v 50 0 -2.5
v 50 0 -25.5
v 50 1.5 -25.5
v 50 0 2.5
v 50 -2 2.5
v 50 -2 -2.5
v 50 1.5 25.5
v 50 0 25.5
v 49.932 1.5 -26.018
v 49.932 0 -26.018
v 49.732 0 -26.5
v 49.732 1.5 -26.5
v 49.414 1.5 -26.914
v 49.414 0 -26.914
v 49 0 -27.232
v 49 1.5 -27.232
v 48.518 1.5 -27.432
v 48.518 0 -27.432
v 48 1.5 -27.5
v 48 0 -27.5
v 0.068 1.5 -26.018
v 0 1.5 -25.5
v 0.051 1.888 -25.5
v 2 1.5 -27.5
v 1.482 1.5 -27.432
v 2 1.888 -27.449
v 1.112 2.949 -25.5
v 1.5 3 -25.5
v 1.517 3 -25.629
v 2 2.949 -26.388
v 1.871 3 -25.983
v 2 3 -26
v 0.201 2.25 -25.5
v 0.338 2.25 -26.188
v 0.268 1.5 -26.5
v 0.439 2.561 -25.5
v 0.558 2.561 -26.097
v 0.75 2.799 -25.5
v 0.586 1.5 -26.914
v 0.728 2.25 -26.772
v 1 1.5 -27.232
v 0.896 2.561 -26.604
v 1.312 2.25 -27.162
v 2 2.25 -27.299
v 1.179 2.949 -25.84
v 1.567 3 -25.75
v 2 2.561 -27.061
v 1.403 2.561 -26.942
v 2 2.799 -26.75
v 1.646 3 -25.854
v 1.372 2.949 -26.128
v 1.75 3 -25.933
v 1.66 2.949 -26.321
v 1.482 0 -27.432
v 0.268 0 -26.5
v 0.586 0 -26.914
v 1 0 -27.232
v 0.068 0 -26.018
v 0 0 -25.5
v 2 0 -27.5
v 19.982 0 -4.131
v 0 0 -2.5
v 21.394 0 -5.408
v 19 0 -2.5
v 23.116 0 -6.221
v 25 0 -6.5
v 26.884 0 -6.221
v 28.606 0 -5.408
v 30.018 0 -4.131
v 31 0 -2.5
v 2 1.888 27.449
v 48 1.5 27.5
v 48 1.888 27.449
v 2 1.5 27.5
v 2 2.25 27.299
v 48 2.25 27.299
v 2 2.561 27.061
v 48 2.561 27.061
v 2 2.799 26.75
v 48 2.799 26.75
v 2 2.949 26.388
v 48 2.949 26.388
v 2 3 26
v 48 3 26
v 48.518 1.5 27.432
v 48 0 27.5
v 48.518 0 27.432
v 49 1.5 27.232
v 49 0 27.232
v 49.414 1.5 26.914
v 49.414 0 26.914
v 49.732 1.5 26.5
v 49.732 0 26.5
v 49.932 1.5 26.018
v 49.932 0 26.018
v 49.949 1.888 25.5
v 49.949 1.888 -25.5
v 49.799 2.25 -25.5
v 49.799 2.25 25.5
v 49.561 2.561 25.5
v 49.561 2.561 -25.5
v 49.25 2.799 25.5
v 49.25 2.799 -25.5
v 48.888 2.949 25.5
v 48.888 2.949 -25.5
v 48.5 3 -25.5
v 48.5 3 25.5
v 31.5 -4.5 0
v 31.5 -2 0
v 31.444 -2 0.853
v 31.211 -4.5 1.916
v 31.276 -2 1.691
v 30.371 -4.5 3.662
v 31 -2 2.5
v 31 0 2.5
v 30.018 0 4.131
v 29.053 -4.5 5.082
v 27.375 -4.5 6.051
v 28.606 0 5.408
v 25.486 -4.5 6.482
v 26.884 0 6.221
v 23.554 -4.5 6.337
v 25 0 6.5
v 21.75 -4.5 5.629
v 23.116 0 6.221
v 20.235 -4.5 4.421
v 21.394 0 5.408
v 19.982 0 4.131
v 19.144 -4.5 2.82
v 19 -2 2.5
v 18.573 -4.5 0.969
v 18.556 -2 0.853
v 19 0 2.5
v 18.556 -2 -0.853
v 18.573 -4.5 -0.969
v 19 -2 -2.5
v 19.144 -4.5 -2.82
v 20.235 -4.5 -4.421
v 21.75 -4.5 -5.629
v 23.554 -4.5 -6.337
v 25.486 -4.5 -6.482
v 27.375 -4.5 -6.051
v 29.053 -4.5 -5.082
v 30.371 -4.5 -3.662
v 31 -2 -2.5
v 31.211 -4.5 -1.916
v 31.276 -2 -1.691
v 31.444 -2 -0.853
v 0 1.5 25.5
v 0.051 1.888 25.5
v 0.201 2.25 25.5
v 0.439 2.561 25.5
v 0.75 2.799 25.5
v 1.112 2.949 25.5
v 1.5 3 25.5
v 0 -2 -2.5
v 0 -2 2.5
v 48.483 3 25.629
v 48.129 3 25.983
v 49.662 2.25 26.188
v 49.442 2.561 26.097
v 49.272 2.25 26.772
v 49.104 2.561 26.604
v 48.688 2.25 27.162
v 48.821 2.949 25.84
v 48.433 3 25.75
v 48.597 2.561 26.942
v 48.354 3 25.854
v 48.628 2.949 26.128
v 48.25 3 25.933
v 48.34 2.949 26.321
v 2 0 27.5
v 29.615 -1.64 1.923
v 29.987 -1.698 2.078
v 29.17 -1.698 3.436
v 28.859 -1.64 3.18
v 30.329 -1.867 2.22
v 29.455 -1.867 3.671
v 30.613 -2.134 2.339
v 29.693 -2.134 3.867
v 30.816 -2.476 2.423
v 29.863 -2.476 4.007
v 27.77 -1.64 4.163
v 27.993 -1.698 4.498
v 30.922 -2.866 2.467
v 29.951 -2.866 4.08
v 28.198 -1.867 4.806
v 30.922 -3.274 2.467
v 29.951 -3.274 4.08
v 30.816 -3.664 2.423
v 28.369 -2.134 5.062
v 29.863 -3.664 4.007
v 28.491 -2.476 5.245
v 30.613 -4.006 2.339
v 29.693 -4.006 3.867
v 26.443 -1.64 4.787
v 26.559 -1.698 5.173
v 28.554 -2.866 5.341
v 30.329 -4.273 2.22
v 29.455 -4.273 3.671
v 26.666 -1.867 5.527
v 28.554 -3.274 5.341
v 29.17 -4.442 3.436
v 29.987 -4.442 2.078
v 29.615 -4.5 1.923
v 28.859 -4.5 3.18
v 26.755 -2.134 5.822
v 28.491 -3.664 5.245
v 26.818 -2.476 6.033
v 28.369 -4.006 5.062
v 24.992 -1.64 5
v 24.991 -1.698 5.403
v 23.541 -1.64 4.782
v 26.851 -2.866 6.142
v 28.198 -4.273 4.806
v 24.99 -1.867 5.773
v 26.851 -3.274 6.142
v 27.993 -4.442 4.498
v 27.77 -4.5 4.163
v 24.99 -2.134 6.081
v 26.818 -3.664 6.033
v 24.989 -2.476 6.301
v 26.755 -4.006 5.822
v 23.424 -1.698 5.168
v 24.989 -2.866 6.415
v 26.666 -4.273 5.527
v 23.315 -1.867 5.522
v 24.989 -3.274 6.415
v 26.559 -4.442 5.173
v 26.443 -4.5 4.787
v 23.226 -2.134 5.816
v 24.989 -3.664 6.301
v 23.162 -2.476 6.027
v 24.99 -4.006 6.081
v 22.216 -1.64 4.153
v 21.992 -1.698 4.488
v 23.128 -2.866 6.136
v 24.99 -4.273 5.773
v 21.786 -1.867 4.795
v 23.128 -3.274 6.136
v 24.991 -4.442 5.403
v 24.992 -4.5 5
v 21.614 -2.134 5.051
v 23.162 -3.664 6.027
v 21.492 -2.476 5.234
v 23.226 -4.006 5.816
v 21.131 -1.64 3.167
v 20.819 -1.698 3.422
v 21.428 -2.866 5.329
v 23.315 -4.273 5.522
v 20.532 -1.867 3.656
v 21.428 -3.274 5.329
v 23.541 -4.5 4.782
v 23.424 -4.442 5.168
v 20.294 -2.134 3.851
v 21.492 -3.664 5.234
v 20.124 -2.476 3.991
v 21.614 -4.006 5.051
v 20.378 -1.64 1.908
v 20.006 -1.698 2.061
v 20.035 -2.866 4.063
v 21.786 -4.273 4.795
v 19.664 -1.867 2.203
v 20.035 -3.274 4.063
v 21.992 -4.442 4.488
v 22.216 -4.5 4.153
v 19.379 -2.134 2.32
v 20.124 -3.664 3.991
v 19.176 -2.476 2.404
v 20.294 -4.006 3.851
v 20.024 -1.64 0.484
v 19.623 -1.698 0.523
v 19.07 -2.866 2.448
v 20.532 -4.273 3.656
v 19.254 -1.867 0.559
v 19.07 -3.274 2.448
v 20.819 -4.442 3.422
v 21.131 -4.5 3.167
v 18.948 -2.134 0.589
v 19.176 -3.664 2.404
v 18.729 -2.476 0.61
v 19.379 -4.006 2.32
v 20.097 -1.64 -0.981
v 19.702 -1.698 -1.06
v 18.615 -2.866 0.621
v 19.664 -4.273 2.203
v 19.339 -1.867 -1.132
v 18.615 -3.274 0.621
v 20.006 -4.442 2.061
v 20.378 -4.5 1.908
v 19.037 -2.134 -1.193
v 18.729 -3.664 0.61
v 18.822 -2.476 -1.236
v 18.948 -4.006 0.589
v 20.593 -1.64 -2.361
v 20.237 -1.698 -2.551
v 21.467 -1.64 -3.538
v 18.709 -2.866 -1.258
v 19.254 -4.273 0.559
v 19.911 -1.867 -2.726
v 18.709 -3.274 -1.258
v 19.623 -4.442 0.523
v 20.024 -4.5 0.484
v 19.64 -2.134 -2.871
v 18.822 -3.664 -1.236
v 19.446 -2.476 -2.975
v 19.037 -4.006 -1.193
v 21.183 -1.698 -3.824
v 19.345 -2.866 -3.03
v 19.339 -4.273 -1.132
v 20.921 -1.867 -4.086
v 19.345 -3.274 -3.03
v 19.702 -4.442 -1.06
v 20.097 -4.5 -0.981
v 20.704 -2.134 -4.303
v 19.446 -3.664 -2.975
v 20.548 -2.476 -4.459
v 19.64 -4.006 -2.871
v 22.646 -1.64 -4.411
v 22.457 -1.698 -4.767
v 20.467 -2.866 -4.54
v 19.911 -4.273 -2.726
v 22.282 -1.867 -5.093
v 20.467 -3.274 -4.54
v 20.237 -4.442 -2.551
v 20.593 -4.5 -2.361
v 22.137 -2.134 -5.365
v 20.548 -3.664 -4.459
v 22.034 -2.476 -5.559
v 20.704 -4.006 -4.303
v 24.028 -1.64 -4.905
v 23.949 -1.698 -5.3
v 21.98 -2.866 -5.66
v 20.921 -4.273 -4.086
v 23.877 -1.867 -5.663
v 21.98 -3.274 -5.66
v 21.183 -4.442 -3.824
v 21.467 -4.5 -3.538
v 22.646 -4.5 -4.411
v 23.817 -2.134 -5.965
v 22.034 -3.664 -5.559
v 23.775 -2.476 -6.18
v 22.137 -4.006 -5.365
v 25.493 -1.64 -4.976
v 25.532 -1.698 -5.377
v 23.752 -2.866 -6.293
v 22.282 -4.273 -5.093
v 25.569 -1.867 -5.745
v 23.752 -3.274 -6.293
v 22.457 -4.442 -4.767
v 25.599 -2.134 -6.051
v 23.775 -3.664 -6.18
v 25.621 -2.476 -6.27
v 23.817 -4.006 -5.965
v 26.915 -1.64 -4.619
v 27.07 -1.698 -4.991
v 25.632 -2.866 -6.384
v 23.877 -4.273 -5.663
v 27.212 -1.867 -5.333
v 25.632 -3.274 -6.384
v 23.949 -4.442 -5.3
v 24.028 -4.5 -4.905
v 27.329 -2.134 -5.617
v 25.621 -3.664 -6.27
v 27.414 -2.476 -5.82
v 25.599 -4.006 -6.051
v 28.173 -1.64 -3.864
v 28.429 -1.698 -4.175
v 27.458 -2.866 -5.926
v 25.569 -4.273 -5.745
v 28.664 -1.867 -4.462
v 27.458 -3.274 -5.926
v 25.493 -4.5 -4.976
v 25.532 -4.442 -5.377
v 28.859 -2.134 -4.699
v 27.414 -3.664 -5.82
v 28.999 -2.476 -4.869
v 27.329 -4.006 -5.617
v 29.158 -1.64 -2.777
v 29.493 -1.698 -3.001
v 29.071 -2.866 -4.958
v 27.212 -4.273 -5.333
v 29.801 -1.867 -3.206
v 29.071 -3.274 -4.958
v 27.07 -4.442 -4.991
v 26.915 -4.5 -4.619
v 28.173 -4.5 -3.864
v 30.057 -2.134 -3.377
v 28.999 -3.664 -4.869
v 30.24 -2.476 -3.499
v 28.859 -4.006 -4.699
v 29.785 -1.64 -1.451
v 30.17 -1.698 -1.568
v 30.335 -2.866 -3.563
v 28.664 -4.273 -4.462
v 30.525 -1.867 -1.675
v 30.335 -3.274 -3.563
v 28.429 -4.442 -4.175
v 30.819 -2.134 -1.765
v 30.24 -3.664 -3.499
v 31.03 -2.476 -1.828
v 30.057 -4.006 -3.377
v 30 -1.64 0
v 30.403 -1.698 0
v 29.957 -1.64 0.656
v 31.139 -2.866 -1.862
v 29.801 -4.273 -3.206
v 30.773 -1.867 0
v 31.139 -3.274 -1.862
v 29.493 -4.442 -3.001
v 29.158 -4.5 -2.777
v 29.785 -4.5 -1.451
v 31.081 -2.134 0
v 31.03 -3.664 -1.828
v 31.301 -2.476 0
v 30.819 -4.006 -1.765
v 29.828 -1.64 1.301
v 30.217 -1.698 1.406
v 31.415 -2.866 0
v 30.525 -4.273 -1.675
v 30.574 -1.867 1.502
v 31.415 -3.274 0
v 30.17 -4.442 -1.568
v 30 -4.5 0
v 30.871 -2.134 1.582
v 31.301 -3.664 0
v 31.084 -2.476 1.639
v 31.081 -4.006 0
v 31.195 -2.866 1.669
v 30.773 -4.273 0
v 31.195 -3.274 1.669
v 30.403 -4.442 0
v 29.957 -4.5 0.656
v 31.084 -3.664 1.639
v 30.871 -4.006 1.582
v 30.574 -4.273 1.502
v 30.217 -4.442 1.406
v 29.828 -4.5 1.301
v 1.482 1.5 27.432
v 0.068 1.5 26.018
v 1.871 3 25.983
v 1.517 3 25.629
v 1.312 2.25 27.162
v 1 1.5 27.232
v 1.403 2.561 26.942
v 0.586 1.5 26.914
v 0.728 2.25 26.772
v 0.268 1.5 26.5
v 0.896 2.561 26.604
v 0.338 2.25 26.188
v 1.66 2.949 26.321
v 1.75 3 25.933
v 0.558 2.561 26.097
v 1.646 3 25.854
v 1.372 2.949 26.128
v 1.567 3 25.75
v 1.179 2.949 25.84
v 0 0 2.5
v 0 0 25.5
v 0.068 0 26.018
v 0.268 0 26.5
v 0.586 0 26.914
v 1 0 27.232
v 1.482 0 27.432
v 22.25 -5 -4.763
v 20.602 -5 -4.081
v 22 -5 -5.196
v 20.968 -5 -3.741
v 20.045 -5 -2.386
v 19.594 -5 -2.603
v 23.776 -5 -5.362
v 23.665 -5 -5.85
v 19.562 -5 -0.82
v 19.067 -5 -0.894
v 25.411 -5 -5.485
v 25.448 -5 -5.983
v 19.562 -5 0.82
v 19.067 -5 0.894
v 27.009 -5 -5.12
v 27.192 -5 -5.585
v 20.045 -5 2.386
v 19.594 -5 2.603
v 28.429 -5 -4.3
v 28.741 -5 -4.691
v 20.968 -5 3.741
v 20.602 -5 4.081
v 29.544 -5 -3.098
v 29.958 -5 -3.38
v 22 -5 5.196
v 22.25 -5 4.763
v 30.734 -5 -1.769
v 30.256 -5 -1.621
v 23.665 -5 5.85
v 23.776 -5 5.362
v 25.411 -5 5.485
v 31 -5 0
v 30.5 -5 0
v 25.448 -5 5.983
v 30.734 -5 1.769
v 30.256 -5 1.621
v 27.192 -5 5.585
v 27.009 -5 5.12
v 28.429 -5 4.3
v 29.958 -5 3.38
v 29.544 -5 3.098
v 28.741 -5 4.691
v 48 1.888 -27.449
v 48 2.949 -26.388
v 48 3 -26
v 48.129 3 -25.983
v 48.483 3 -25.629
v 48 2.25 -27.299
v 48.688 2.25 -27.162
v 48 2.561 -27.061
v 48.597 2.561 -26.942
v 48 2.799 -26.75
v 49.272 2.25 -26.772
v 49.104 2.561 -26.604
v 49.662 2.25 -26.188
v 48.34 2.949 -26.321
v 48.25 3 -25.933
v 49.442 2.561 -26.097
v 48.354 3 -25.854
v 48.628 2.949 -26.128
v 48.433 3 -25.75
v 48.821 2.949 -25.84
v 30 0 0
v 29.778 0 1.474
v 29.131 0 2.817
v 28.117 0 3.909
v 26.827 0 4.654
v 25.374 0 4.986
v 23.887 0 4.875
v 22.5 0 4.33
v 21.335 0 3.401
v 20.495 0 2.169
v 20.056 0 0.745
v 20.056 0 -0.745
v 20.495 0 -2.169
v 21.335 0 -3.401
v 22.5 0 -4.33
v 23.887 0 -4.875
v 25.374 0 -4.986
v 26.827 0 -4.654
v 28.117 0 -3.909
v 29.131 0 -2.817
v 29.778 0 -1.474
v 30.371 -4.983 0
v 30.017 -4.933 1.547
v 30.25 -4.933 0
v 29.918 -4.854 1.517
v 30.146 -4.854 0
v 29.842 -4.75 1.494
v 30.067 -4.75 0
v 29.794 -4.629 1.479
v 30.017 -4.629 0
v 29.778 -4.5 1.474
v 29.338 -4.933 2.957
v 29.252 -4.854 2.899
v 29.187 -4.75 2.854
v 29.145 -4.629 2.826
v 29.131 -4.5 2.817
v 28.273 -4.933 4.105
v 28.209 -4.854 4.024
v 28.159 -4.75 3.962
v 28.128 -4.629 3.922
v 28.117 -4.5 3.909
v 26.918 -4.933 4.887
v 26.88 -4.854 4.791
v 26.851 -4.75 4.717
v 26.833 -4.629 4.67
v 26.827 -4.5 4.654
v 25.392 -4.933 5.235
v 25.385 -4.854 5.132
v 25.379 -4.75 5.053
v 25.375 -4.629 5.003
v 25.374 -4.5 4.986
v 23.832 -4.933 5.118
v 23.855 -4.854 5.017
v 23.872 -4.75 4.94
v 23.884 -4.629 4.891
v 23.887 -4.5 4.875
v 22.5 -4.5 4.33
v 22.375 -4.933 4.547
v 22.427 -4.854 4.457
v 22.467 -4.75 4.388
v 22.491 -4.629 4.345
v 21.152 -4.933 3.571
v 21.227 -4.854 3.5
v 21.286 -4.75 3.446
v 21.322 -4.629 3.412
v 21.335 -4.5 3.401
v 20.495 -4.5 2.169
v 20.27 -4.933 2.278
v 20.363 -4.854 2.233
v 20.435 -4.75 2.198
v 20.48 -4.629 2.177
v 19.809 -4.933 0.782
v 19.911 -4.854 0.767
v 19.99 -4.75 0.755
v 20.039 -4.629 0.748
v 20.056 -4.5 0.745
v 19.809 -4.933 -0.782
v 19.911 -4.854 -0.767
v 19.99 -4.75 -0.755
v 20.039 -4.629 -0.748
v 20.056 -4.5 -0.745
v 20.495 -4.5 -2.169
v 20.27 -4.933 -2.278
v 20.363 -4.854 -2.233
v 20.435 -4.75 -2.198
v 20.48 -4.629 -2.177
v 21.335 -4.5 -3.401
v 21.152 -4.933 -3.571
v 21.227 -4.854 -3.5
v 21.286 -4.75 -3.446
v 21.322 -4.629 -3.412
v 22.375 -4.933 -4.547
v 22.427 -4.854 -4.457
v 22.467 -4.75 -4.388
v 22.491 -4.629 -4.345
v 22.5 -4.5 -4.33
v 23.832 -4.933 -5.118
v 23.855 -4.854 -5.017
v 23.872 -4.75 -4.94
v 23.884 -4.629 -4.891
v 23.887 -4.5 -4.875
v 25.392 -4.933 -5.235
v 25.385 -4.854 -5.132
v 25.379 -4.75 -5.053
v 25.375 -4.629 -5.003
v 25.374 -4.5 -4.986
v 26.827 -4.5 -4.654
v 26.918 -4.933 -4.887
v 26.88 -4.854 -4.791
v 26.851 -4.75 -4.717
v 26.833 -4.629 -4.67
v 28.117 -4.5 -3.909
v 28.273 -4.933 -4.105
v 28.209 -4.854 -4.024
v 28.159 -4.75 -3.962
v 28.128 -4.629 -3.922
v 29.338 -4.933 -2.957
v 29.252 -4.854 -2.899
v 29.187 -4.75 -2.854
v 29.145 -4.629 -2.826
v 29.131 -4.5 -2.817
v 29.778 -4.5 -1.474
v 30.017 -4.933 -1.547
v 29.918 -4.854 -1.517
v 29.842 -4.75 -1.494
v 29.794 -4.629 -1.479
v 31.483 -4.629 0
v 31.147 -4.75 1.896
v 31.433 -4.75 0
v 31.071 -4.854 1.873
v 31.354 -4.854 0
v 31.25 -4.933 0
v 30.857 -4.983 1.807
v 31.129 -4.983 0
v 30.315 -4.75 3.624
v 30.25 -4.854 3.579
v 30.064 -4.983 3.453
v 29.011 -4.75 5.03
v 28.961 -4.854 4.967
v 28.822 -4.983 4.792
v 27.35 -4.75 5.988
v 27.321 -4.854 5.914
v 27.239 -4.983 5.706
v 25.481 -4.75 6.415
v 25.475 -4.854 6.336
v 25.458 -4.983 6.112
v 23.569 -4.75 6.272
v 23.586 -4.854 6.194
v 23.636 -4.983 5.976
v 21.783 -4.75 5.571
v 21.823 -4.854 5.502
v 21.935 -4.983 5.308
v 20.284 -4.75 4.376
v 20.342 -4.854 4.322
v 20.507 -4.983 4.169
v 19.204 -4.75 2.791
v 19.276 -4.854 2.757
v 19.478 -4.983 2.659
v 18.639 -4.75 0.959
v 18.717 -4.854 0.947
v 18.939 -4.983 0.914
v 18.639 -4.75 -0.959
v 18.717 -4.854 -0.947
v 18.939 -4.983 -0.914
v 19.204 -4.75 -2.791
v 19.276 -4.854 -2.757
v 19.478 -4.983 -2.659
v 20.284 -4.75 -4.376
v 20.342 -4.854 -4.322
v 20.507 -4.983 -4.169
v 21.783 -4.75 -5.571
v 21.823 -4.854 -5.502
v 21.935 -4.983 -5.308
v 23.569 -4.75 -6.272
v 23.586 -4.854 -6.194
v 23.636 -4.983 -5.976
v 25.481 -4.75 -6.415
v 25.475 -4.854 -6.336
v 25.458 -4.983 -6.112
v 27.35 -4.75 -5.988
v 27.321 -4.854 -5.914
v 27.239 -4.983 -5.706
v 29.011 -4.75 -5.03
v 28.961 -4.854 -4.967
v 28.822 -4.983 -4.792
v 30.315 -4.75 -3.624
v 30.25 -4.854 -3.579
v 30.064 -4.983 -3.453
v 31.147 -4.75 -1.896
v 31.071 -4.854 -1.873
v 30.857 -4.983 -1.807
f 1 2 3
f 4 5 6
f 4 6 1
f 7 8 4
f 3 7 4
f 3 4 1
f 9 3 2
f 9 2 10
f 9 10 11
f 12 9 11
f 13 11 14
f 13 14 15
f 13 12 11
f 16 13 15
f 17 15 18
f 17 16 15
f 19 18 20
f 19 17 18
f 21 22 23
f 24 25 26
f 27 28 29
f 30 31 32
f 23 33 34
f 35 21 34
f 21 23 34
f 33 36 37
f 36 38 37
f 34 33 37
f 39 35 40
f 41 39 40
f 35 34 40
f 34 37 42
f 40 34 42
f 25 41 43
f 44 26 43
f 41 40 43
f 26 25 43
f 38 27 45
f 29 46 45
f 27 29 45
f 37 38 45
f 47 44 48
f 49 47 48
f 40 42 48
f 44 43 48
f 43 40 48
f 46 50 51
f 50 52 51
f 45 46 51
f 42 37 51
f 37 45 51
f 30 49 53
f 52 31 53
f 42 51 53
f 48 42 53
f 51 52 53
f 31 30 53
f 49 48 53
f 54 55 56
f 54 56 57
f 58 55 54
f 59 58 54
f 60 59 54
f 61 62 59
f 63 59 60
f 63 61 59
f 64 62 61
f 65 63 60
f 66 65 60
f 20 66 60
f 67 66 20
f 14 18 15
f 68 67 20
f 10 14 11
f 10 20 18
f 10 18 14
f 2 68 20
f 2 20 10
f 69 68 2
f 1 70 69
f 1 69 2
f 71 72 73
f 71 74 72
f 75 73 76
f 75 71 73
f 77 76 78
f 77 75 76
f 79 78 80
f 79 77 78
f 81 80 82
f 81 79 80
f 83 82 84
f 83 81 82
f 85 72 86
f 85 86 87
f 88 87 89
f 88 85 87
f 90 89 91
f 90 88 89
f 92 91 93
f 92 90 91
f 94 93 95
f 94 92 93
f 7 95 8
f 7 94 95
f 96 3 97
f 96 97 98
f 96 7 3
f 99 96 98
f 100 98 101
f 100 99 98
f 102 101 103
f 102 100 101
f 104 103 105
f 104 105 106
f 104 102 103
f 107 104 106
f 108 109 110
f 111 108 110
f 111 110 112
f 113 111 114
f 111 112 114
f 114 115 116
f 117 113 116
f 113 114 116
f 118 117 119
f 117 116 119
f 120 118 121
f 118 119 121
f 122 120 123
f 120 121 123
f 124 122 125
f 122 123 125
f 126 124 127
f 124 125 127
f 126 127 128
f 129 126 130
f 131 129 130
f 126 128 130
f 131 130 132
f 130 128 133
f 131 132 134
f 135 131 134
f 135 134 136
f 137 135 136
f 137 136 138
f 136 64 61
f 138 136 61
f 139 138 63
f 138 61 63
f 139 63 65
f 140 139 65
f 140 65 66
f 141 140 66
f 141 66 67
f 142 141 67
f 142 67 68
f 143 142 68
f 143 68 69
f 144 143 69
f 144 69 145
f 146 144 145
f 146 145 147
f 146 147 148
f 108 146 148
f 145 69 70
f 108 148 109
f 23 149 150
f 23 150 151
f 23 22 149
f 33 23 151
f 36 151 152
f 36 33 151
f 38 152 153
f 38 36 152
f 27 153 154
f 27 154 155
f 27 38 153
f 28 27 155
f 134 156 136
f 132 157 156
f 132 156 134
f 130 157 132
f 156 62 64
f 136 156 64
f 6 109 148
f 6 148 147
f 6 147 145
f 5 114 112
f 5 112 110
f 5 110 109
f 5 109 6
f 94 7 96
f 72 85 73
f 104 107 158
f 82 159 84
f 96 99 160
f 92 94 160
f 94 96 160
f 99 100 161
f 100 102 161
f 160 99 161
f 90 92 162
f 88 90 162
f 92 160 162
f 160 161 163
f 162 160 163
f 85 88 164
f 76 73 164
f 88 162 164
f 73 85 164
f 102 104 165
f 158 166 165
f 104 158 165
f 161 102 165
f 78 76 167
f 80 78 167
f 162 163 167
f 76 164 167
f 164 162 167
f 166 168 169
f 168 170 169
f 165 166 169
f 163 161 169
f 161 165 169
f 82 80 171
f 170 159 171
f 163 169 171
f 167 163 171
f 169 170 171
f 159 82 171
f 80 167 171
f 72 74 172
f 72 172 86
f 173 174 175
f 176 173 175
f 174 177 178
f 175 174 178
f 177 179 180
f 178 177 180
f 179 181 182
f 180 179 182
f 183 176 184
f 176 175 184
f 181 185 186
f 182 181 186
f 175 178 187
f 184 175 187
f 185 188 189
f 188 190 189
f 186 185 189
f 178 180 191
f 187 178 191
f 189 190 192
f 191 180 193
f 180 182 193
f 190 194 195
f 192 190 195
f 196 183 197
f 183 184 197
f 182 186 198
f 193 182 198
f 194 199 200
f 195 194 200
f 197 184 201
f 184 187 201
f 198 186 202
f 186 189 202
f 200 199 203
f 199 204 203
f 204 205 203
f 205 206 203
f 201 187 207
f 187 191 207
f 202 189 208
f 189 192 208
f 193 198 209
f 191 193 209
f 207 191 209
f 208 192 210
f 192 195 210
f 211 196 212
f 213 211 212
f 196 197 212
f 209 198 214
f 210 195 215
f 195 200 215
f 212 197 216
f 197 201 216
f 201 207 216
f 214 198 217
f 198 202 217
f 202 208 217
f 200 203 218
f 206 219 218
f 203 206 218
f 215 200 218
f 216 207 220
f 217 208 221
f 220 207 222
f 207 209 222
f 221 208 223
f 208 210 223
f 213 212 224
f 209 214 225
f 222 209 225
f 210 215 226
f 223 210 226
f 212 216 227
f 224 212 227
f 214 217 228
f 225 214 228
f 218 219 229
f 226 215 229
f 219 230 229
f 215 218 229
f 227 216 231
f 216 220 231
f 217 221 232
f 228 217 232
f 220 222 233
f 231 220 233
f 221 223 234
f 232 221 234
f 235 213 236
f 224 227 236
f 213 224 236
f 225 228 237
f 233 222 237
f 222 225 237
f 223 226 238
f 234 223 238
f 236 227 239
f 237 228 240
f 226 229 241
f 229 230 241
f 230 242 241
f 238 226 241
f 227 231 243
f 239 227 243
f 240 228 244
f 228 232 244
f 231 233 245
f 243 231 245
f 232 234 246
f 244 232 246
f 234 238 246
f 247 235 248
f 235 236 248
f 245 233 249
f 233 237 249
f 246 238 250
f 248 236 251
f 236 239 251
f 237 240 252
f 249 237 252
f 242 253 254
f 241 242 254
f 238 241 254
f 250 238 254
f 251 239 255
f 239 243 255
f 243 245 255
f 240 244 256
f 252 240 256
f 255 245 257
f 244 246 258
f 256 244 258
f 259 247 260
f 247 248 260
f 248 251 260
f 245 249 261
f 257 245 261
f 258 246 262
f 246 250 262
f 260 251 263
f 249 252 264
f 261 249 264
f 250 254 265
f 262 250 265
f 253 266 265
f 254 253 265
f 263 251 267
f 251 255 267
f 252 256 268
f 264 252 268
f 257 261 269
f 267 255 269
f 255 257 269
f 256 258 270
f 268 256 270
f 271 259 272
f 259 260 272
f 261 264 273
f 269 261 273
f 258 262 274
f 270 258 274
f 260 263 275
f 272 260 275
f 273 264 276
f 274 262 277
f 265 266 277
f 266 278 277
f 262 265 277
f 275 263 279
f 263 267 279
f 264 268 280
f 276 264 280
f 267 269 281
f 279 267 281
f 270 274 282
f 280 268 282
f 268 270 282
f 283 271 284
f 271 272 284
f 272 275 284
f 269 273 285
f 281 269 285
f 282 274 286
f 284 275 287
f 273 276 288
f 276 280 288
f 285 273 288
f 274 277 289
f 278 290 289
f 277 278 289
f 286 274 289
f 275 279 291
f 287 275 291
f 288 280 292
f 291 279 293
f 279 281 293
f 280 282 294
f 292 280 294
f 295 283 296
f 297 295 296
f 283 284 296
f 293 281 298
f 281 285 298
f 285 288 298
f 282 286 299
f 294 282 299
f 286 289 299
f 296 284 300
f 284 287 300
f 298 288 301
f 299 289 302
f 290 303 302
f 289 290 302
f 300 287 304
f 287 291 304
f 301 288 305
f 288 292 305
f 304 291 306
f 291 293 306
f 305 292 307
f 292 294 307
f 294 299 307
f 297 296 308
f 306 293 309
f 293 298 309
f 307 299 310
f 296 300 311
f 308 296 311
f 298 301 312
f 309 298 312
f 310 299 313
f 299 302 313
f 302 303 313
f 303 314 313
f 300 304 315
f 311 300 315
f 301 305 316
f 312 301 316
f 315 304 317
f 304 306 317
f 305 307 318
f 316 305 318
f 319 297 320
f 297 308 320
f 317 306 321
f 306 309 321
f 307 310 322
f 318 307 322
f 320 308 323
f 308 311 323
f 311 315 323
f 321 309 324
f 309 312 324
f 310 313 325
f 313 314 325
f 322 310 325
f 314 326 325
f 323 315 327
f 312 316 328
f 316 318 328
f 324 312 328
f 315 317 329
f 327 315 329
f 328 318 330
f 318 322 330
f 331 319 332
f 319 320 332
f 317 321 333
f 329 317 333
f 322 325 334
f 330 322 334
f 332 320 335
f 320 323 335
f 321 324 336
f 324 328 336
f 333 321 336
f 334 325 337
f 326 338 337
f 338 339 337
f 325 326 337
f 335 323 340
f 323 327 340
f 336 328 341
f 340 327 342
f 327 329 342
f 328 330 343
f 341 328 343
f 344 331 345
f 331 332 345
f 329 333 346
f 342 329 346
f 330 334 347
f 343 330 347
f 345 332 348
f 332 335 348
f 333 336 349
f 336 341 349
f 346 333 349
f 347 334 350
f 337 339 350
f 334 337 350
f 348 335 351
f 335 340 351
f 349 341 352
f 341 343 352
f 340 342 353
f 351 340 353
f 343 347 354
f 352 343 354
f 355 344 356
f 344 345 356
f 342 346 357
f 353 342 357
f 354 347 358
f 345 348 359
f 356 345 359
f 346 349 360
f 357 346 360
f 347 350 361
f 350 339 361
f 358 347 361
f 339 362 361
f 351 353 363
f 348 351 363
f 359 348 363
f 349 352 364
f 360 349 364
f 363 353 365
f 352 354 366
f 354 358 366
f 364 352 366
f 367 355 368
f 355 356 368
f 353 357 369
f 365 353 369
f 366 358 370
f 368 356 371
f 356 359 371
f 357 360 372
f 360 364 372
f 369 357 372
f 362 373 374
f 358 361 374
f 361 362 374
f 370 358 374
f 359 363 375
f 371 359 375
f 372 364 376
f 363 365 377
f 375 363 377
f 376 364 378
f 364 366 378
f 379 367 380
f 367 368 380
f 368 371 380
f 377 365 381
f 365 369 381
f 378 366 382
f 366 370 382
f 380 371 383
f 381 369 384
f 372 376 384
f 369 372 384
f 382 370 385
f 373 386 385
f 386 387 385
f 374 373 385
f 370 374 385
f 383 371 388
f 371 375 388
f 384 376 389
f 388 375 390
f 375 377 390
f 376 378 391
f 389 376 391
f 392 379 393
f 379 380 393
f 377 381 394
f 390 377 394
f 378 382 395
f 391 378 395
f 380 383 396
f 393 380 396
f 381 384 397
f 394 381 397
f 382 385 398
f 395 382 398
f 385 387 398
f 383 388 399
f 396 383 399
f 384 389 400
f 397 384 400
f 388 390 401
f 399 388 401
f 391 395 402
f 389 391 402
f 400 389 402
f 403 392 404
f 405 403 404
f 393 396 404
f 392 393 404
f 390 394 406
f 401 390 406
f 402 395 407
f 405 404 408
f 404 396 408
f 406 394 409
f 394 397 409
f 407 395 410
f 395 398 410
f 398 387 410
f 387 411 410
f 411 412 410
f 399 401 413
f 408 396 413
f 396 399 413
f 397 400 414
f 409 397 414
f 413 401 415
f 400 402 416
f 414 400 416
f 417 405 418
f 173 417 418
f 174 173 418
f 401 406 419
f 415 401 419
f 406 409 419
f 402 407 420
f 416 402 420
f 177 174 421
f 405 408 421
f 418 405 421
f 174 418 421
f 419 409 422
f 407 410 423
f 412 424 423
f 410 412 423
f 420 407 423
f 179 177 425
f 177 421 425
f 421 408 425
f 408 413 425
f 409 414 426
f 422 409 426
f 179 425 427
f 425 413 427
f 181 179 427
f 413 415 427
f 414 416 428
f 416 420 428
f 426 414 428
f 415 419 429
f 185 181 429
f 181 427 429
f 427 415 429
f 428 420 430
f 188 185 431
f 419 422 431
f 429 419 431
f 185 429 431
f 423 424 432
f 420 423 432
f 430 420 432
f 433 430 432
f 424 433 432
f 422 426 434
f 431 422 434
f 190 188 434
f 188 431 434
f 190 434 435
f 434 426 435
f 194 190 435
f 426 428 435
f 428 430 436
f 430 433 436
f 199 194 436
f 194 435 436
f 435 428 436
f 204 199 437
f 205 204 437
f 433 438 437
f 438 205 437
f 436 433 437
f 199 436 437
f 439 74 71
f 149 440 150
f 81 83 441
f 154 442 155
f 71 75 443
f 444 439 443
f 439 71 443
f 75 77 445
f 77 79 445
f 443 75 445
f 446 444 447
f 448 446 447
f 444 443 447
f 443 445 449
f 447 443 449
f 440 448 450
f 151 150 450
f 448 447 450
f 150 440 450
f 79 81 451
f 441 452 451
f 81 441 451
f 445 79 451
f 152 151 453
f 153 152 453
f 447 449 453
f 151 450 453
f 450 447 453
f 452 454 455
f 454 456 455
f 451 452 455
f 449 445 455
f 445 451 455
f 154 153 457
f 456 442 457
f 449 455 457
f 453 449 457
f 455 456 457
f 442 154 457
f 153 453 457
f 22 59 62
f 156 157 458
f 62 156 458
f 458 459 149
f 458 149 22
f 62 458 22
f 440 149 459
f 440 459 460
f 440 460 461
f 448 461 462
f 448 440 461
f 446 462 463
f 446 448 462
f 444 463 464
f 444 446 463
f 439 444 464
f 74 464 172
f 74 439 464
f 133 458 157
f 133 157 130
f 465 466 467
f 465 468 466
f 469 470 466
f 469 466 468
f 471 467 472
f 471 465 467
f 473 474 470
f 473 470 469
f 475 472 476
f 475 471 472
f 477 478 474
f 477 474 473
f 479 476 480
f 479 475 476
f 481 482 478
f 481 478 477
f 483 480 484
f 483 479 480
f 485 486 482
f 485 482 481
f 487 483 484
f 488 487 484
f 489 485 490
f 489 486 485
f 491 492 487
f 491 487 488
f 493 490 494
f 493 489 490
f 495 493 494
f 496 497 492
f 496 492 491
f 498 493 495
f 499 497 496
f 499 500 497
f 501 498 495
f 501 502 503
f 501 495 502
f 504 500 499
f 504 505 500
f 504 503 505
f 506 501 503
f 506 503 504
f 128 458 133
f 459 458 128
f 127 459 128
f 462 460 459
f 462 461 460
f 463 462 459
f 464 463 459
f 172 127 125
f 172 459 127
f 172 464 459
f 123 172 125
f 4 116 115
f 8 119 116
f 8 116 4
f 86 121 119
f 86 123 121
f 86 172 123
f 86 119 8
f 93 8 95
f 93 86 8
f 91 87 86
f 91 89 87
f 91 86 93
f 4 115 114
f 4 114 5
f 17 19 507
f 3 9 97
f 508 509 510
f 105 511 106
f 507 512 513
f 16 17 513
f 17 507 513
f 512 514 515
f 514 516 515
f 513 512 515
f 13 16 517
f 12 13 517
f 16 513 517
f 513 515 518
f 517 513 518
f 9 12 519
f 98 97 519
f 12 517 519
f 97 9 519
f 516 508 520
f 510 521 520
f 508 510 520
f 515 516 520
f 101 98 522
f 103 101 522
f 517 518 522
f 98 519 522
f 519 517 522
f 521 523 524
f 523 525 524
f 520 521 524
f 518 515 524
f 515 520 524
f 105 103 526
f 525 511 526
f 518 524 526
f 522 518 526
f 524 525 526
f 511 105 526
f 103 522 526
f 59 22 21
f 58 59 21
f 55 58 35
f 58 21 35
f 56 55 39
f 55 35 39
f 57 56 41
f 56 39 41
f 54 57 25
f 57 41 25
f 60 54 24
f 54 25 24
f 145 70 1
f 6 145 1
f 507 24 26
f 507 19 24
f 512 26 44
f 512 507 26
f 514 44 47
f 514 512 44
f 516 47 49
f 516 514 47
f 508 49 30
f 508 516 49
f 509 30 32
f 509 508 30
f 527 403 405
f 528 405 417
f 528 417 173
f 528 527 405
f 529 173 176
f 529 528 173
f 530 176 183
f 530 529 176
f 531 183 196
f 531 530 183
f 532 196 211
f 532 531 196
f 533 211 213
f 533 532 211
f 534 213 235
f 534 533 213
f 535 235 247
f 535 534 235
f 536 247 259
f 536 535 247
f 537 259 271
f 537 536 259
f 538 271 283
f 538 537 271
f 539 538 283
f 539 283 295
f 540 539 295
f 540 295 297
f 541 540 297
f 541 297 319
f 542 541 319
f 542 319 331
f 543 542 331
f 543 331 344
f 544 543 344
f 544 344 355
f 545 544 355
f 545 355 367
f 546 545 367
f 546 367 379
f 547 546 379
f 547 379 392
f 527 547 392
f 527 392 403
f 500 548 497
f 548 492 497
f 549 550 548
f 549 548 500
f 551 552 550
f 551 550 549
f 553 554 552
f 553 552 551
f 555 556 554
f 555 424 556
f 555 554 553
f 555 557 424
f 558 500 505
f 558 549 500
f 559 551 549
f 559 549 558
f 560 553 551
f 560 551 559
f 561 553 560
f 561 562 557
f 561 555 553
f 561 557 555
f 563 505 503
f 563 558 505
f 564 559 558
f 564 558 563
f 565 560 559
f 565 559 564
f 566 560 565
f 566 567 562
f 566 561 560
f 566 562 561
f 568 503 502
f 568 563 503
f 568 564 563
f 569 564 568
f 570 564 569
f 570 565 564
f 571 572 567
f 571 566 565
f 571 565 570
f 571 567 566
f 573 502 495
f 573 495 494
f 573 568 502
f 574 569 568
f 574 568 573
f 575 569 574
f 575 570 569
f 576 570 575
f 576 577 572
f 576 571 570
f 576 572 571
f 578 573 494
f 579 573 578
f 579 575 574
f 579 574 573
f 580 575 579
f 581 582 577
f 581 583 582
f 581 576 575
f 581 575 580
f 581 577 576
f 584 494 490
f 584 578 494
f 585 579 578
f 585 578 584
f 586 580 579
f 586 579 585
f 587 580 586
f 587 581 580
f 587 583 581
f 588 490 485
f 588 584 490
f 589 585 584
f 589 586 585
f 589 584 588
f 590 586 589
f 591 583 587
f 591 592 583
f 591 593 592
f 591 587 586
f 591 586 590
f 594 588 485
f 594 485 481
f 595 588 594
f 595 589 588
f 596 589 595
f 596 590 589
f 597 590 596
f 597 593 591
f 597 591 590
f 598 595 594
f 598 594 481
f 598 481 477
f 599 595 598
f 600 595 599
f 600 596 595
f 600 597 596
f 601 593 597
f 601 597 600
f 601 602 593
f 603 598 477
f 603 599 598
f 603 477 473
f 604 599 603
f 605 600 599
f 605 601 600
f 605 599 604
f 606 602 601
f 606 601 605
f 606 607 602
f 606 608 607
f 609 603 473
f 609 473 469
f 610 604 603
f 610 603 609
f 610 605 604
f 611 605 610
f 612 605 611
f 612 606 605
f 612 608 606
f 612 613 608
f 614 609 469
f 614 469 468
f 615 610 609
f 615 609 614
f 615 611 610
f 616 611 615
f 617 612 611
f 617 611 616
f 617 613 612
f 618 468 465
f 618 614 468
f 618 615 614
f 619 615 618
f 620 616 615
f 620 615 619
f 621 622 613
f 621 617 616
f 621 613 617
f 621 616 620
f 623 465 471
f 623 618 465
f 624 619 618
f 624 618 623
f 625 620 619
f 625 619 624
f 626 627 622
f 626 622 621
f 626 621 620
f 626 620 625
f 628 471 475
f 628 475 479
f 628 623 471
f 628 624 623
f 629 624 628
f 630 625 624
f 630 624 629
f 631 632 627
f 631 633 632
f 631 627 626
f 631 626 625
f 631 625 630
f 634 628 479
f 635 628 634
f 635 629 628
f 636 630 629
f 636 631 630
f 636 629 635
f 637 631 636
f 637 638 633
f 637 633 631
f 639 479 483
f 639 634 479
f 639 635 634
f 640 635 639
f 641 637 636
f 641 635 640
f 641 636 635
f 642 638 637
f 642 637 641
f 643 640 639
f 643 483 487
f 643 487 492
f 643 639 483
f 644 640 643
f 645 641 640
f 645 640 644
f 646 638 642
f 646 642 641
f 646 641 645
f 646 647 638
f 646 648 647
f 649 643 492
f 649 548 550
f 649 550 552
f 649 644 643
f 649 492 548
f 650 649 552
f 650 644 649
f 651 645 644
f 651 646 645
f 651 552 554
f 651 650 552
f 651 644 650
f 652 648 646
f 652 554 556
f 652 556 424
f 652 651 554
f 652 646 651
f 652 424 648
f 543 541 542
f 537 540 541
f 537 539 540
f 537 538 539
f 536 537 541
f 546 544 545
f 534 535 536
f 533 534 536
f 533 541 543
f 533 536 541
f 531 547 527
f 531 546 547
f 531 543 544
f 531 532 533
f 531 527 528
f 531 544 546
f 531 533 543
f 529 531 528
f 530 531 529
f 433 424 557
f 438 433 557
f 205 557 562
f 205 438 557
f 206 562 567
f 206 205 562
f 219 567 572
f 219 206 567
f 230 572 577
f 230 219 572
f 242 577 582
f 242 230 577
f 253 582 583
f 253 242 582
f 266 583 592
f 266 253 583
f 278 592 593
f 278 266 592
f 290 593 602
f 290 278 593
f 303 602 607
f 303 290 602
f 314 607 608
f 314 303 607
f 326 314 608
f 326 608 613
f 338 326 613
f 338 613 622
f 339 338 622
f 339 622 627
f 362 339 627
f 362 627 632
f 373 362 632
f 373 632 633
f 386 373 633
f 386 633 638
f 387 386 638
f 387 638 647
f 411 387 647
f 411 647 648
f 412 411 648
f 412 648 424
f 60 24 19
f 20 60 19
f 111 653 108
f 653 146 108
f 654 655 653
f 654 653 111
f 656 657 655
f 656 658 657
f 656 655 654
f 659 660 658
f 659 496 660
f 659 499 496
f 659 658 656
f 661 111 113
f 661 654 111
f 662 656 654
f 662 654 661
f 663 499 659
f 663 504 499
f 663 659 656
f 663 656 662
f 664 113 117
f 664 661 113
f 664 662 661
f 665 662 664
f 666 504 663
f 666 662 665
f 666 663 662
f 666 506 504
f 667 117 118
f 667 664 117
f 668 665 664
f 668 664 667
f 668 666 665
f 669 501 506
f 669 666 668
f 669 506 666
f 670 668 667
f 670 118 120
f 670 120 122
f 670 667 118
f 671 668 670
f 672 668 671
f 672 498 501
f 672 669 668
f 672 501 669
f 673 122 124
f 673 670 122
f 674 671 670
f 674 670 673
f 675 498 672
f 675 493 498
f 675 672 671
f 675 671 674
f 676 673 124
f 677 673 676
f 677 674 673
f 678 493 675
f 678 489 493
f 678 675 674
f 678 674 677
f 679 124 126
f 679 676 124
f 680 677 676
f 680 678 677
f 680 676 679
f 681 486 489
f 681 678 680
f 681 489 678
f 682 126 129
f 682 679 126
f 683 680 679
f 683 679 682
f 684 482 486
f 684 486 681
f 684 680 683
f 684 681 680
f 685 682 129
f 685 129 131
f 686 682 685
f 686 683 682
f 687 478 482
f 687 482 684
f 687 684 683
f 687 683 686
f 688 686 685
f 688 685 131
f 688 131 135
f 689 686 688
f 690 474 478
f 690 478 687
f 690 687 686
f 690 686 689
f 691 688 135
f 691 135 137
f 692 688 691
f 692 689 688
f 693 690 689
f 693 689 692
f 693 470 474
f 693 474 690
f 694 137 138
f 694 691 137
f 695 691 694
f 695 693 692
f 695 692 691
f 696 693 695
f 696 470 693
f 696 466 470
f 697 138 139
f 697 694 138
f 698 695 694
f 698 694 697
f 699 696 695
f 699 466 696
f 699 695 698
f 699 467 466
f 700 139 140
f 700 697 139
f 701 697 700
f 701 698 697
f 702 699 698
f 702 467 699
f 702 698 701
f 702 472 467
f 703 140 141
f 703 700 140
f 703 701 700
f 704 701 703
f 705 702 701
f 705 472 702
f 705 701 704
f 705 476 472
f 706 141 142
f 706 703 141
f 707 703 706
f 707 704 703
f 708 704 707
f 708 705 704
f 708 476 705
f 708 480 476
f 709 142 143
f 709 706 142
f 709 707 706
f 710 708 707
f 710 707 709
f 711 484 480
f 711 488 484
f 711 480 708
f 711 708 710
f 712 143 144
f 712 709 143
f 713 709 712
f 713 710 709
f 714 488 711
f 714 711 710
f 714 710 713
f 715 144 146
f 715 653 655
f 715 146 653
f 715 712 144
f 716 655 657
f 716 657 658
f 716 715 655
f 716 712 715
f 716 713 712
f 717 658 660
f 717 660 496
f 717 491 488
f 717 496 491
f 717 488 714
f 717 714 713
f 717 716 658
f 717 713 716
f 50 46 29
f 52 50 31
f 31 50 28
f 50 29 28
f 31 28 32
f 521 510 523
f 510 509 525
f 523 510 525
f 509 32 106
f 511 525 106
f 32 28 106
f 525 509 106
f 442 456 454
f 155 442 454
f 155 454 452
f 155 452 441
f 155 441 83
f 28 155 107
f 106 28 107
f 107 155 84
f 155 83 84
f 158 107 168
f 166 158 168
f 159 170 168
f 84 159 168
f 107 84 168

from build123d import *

# Parameters (mm, degrees)
SKETCH1_W             = 50
SKETCH1_H             = 3
SOLARPANET_DEPTH      = 27.5
FILLET1_R             = 2
FILLET2_R             = 1.5
SKETCH2_W             = 50
SKETCH2_H             = 5
BACKSUPPORT_DEPTH     = 2
SKETCH3_R             = 6.5
SKETCH3_R_2           = 5
SUPPORTRING_DEPTH     = 5
HOLE_START            = -5
SKETCH4_R             = 5
HOLE_4_JOYSTICK_DEPTH = 5
FILLET4_R             = 0.5


with BuildPart() as part:
    # Sketch1 → SolarPanet (new, symmetric)
    with BuildSketch(Plane.XY):
        with Locations((25, 1.5)):
            Rectangle(SKETCH1_W, SKETCH1_H)
    extrude(amount=SOLARPANET_DEPTH, both=True)

    # Fillet1
    fillet1_edges = [part.edges().sort_by_distance(p)[0] for p in [
        (50, 1.5, 27.5),
        (0, 1.5, 27.5),
        (50, 1.5, -27.5),
        (0, 1.5, -27.5),
    ]]
    fillet(fillet1_edges, radius=FILLET1_R)

    # Fillet2
    fillet2_edges = [part.edges().sort_by_distance(p)[0] for p in [
        (0, 3, 0),
        (25, 3, -27.5),
        (25, 3, 27.5),
        (50, 3, 0),
        (0.585786438, 3, 26.914213562),
        (49.414213562, 3, 26.914213562),
        (49.414213562, 3, -26.914213562),
        (0.585786438, 3, -26.914213562),
    ]]
    fillet(fillet2_edges, radius=FILLET2_R)

    # Sketch2 → BackSupport (add)
    with BuildSketch(Plane.XZ):
        with Locations((25, 0)):
            Rectangle(SKETCH2_W, SKETCH2_H)
    extrude(amount=BACKSUPPORT_DEPTH)

    # Sketch3 → SupportRing (add)
    with BuildSketch(Plane.XZ):
        with Locations((25, 0)):
            Circle(SKETCH3_R)
        with Locations((25, 0)):
            Circle(SKETCH3_R_2, mode=Mode.SUBTRACT)
    extrude(amount=SUPPORTRING_DEPTH)

    # Sketch4 → Hole 4 Joystick (cut)
    with BuildSketch(Plane.XZ.offset(5).offset(HOLE_START)):
        with Locations((25, 0)):
            Circle(SKETCH4_R)
    extrude(amount=HOLE_4_JOYSTICK_DEPTH, mode=Mode.SUBTRACT)

    # Sketch5 → Round Cut 4 Joystick (revolve, cut)
    with BuildSketch(Plane.XY, mode=Mode.PRIVATE) as round_cut_4_joystick_sk:
        with BuildLine():
            Line((25, -1.64), (30, -1.64))
            ThreePointArc((30, -1.64), (31.43, -3.07), (30, -4.5))
            Line((30, -4.5), (25, -4.5))
            Line((25, -4.5), (25, -1.64))
        make_face()
    revolve(round_cut_4_joystick_sk.sketch.rotate(Axis((25, 10.438378753, 0), (0, -1, 0)), 22.619864948), axis=Axis((25, 10.438378753, 0), (0, -1, 0)), mode=Mode.SUBTRACT)

    # Fillet4
    fillet4_edges = [part.edges().sort_by_distance(p)[0] for p in [
        (20, -5, 0),
        (18.5, -5, 0),
    ]]
    fillet(fillet4_edges, radius=FILLET4_R - 0.0001)  # a hair under: the kernel refuses the full size


solid = part.part
